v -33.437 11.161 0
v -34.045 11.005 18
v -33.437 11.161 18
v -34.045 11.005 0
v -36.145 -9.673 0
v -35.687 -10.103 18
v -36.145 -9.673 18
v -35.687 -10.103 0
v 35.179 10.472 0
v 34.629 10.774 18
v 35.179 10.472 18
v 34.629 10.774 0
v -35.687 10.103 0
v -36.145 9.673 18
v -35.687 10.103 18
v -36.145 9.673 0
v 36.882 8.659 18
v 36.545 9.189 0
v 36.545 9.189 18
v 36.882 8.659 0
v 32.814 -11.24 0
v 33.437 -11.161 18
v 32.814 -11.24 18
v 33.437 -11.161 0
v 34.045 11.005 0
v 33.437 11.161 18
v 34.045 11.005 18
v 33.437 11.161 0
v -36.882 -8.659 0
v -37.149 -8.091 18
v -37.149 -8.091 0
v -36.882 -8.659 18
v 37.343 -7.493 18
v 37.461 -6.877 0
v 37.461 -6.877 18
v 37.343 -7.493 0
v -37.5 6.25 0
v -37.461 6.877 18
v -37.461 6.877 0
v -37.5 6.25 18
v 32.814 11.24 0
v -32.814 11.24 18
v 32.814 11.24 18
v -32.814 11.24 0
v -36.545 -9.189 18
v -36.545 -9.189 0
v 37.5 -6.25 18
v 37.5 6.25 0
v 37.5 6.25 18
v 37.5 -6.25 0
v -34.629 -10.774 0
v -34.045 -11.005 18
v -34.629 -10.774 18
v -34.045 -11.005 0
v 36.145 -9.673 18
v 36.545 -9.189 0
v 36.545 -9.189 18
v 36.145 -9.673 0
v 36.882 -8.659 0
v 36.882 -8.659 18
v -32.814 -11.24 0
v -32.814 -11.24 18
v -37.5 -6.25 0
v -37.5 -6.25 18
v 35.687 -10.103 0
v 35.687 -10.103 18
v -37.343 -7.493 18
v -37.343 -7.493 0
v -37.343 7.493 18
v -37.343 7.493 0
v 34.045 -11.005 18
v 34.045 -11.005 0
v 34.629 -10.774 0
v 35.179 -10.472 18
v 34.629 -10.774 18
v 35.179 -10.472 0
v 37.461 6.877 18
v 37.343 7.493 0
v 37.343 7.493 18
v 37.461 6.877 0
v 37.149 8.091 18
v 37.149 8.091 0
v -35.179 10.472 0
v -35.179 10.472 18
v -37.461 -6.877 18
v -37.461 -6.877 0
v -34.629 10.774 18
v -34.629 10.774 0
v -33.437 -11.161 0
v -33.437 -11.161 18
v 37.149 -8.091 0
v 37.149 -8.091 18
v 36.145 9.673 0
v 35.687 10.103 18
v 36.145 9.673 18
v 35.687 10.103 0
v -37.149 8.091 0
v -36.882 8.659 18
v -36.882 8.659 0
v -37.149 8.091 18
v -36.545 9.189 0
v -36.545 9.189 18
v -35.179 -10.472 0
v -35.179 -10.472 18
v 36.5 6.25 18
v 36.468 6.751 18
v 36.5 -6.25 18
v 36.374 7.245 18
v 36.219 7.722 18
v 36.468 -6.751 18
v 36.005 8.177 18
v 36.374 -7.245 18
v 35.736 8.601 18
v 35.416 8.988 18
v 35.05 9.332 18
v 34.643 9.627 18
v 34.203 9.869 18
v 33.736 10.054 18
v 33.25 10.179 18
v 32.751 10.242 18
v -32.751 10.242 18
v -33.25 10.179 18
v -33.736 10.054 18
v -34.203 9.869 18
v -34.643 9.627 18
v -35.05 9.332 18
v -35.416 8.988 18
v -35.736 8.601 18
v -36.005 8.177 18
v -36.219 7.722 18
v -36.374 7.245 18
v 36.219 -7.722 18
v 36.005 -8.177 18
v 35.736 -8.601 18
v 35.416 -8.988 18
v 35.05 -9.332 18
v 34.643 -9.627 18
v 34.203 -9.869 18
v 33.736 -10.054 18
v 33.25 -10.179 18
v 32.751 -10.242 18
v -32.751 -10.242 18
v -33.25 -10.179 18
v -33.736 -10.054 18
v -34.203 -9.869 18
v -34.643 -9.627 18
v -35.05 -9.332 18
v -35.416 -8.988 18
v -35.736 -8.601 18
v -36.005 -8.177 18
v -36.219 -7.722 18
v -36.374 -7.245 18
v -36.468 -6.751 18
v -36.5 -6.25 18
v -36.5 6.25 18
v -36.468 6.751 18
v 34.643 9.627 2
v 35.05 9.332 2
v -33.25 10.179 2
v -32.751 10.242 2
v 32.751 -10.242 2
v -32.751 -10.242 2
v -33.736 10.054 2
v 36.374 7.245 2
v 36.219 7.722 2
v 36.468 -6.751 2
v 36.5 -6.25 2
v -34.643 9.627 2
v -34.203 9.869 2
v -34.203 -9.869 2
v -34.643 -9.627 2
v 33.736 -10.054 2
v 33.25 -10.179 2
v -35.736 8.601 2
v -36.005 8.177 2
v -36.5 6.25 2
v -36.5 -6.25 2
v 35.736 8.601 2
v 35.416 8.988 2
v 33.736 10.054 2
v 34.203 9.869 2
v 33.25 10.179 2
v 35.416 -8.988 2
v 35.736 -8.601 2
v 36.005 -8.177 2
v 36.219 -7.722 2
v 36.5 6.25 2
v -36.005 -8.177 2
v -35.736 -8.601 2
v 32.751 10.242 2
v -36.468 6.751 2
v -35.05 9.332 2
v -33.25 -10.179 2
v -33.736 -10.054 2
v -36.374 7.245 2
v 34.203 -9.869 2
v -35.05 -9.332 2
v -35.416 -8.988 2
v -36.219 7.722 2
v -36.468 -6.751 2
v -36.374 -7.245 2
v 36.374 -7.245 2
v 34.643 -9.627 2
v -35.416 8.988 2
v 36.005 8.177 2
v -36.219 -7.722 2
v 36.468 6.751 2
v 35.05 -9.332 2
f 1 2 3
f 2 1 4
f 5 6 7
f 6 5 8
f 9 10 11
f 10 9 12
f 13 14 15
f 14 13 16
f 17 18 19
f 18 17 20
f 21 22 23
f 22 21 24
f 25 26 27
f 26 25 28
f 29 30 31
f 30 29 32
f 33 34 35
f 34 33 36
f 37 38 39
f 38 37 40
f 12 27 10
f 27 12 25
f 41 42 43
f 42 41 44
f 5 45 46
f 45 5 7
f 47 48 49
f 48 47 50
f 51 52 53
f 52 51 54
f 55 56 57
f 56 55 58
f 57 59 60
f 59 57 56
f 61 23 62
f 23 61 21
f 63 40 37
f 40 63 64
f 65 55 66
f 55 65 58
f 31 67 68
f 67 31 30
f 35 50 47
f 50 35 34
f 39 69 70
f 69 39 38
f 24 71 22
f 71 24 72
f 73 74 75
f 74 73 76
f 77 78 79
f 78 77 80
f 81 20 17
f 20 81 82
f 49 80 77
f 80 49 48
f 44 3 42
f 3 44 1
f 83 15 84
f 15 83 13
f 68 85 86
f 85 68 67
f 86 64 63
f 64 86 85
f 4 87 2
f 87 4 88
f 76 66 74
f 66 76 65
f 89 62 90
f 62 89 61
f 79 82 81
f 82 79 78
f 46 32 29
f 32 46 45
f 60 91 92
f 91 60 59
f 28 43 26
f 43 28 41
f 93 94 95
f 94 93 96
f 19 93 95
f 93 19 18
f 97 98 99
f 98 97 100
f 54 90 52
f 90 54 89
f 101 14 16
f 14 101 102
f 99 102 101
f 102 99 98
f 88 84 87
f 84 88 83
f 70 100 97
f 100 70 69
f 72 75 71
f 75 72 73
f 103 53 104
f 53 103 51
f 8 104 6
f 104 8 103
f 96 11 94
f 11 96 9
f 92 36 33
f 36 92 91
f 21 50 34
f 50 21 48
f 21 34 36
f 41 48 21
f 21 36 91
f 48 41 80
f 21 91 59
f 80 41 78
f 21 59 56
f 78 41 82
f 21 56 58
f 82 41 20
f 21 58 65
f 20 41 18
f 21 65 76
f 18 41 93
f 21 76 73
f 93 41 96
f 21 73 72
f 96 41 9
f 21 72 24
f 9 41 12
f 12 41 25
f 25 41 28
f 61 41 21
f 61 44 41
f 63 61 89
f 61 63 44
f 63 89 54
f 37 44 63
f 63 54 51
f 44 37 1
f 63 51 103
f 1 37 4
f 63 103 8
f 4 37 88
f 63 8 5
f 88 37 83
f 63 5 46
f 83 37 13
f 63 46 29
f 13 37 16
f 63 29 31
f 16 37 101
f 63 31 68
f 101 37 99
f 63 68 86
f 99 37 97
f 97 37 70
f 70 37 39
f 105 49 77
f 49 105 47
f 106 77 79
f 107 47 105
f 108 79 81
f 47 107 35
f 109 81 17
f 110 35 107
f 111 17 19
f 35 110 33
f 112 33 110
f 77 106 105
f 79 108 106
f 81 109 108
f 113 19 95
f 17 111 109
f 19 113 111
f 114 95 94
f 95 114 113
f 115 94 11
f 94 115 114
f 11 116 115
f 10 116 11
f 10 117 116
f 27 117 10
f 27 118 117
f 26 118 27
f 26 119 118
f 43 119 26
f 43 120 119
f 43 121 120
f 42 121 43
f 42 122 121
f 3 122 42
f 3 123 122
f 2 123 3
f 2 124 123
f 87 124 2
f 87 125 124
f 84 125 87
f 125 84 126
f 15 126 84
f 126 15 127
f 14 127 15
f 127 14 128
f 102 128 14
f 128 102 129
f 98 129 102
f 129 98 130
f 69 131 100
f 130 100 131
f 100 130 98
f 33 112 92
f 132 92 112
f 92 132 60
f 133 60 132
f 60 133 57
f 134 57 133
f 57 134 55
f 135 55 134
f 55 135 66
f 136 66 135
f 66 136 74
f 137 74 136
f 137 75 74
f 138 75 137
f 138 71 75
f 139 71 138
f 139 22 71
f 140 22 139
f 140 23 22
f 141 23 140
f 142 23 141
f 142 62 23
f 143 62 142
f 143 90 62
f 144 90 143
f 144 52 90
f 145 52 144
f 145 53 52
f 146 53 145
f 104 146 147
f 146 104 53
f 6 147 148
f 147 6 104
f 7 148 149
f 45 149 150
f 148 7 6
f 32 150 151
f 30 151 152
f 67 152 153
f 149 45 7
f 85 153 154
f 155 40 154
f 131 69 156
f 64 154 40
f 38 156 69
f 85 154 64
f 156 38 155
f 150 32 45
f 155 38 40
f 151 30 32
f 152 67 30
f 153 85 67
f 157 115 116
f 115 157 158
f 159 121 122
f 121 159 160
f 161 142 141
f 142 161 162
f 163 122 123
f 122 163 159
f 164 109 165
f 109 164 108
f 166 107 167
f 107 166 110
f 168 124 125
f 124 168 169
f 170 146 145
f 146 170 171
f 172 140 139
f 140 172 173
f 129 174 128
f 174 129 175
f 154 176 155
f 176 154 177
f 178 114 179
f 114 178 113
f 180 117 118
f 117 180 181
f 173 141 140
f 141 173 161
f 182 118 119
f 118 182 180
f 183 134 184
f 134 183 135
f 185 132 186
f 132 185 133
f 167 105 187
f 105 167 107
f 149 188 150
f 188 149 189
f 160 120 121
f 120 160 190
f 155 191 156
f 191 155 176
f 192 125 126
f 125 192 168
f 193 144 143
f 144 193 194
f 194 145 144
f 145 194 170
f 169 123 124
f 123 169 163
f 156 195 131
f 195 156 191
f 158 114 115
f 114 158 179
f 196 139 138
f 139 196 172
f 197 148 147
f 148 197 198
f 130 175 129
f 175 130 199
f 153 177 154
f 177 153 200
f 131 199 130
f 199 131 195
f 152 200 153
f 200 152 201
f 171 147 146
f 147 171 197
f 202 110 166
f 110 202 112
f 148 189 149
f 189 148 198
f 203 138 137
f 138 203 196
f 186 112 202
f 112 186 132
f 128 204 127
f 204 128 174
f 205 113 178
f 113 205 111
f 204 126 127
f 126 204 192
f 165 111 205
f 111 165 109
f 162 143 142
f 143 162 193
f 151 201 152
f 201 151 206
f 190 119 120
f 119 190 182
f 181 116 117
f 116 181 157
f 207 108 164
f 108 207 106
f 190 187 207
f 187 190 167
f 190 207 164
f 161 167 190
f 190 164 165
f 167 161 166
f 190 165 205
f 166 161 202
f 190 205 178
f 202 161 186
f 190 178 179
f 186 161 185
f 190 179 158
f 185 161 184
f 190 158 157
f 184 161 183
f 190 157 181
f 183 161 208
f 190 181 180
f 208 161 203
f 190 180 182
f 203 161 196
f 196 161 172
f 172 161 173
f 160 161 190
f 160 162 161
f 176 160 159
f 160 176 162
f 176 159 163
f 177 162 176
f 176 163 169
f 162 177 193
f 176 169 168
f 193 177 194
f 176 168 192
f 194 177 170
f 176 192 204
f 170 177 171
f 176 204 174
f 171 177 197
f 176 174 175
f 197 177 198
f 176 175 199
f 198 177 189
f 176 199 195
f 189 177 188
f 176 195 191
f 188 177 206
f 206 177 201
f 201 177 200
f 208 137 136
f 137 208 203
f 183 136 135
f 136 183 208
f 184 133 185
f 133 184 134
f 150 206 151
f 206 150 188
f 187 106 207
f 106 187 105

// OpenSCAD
$fn = 50;


difference() {
	union() {
		hull() {
			translate(v = [-32.5000000000, 6.2500000000, 0]) {
				cylinder(h = 18, r = 5);
			}
			translate(v = [32.5000000000, 6.2500000000, 0]) {
				cylinder(h = 18, r = 5);
			}
			translate(v = [-32.5000000000, -6.2500000000, 0]) {
				cylinder(h = 18, r = 5);
			}
			translate(v = [32.5000000000, -6.2500000000, 0]) {
				cylinder(h = 18, r = 5);
			}
		}
	}
	union() {
		translate(v = [0, 0, 2]) {
			hull() {
				translate(v = [-32.5000000000, 6.2500000000, 0]) {
					cylinder(h = 16, r = 4);
				}
				translate(v = [32.5000000000, 6.2500000000, 0]) {
					cylinder(h = 16, r = 4);
				}
				translate(v = [-32.5000000000, -6.2500000000, 0]) {
					cylinder(h = 16, r = 4);
				}
				translate(v = [32.5000000000, -6.2500000000, 0]) {
					cylinder(h = 16, r = 4);
				}
			}
		}
	}
}
